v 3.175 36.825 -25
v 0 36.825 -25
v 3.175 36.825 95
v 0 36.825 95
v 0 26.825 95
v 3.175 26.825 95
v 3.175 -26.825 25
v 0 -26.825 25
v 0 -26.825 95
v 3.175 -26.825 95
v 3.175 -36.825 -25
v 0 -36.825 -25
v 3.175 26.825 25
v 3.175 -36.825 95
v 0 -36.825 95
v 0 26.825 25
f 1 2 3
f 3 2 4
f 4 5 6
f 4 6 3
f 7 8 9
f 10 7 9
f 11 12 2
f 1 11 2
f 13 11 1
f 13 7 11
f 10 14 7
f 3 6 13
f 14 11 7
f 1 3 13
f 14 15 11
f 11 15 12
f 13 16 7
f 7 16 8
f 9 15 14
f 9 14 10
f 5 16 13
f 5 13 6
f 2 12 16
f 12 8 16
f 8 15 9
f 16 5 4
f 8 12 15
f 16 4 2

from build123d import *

# Parameters (mm, degrees)
F0_W     = 10
F0_H     = 70
F1_DEPTH = 3.175


with BuildPart() as f1:
    # F0 (on Right) → F1 (new body)
    with BuildSketch(Plane.YZ):
        Polygon((36.825, -25), (26.825, 25), (-26.825, 25), (-36.825, -25), align=None)
        with Locations((31.825, 60)):
            Rectangle(F0_W, F0_H)
        Polygon((36.825, -25), (36.825, 25), (26.825, 25), align=None)
        Polygon((-36.825, -25), (-26.825, 25), (-36.825, 25), align=None)
        with Locations((-31.825, 60)):
            Rectangle(F0_W, F0_H)
    extrude(amount=F1_DEPTH)


solid = f1.part
